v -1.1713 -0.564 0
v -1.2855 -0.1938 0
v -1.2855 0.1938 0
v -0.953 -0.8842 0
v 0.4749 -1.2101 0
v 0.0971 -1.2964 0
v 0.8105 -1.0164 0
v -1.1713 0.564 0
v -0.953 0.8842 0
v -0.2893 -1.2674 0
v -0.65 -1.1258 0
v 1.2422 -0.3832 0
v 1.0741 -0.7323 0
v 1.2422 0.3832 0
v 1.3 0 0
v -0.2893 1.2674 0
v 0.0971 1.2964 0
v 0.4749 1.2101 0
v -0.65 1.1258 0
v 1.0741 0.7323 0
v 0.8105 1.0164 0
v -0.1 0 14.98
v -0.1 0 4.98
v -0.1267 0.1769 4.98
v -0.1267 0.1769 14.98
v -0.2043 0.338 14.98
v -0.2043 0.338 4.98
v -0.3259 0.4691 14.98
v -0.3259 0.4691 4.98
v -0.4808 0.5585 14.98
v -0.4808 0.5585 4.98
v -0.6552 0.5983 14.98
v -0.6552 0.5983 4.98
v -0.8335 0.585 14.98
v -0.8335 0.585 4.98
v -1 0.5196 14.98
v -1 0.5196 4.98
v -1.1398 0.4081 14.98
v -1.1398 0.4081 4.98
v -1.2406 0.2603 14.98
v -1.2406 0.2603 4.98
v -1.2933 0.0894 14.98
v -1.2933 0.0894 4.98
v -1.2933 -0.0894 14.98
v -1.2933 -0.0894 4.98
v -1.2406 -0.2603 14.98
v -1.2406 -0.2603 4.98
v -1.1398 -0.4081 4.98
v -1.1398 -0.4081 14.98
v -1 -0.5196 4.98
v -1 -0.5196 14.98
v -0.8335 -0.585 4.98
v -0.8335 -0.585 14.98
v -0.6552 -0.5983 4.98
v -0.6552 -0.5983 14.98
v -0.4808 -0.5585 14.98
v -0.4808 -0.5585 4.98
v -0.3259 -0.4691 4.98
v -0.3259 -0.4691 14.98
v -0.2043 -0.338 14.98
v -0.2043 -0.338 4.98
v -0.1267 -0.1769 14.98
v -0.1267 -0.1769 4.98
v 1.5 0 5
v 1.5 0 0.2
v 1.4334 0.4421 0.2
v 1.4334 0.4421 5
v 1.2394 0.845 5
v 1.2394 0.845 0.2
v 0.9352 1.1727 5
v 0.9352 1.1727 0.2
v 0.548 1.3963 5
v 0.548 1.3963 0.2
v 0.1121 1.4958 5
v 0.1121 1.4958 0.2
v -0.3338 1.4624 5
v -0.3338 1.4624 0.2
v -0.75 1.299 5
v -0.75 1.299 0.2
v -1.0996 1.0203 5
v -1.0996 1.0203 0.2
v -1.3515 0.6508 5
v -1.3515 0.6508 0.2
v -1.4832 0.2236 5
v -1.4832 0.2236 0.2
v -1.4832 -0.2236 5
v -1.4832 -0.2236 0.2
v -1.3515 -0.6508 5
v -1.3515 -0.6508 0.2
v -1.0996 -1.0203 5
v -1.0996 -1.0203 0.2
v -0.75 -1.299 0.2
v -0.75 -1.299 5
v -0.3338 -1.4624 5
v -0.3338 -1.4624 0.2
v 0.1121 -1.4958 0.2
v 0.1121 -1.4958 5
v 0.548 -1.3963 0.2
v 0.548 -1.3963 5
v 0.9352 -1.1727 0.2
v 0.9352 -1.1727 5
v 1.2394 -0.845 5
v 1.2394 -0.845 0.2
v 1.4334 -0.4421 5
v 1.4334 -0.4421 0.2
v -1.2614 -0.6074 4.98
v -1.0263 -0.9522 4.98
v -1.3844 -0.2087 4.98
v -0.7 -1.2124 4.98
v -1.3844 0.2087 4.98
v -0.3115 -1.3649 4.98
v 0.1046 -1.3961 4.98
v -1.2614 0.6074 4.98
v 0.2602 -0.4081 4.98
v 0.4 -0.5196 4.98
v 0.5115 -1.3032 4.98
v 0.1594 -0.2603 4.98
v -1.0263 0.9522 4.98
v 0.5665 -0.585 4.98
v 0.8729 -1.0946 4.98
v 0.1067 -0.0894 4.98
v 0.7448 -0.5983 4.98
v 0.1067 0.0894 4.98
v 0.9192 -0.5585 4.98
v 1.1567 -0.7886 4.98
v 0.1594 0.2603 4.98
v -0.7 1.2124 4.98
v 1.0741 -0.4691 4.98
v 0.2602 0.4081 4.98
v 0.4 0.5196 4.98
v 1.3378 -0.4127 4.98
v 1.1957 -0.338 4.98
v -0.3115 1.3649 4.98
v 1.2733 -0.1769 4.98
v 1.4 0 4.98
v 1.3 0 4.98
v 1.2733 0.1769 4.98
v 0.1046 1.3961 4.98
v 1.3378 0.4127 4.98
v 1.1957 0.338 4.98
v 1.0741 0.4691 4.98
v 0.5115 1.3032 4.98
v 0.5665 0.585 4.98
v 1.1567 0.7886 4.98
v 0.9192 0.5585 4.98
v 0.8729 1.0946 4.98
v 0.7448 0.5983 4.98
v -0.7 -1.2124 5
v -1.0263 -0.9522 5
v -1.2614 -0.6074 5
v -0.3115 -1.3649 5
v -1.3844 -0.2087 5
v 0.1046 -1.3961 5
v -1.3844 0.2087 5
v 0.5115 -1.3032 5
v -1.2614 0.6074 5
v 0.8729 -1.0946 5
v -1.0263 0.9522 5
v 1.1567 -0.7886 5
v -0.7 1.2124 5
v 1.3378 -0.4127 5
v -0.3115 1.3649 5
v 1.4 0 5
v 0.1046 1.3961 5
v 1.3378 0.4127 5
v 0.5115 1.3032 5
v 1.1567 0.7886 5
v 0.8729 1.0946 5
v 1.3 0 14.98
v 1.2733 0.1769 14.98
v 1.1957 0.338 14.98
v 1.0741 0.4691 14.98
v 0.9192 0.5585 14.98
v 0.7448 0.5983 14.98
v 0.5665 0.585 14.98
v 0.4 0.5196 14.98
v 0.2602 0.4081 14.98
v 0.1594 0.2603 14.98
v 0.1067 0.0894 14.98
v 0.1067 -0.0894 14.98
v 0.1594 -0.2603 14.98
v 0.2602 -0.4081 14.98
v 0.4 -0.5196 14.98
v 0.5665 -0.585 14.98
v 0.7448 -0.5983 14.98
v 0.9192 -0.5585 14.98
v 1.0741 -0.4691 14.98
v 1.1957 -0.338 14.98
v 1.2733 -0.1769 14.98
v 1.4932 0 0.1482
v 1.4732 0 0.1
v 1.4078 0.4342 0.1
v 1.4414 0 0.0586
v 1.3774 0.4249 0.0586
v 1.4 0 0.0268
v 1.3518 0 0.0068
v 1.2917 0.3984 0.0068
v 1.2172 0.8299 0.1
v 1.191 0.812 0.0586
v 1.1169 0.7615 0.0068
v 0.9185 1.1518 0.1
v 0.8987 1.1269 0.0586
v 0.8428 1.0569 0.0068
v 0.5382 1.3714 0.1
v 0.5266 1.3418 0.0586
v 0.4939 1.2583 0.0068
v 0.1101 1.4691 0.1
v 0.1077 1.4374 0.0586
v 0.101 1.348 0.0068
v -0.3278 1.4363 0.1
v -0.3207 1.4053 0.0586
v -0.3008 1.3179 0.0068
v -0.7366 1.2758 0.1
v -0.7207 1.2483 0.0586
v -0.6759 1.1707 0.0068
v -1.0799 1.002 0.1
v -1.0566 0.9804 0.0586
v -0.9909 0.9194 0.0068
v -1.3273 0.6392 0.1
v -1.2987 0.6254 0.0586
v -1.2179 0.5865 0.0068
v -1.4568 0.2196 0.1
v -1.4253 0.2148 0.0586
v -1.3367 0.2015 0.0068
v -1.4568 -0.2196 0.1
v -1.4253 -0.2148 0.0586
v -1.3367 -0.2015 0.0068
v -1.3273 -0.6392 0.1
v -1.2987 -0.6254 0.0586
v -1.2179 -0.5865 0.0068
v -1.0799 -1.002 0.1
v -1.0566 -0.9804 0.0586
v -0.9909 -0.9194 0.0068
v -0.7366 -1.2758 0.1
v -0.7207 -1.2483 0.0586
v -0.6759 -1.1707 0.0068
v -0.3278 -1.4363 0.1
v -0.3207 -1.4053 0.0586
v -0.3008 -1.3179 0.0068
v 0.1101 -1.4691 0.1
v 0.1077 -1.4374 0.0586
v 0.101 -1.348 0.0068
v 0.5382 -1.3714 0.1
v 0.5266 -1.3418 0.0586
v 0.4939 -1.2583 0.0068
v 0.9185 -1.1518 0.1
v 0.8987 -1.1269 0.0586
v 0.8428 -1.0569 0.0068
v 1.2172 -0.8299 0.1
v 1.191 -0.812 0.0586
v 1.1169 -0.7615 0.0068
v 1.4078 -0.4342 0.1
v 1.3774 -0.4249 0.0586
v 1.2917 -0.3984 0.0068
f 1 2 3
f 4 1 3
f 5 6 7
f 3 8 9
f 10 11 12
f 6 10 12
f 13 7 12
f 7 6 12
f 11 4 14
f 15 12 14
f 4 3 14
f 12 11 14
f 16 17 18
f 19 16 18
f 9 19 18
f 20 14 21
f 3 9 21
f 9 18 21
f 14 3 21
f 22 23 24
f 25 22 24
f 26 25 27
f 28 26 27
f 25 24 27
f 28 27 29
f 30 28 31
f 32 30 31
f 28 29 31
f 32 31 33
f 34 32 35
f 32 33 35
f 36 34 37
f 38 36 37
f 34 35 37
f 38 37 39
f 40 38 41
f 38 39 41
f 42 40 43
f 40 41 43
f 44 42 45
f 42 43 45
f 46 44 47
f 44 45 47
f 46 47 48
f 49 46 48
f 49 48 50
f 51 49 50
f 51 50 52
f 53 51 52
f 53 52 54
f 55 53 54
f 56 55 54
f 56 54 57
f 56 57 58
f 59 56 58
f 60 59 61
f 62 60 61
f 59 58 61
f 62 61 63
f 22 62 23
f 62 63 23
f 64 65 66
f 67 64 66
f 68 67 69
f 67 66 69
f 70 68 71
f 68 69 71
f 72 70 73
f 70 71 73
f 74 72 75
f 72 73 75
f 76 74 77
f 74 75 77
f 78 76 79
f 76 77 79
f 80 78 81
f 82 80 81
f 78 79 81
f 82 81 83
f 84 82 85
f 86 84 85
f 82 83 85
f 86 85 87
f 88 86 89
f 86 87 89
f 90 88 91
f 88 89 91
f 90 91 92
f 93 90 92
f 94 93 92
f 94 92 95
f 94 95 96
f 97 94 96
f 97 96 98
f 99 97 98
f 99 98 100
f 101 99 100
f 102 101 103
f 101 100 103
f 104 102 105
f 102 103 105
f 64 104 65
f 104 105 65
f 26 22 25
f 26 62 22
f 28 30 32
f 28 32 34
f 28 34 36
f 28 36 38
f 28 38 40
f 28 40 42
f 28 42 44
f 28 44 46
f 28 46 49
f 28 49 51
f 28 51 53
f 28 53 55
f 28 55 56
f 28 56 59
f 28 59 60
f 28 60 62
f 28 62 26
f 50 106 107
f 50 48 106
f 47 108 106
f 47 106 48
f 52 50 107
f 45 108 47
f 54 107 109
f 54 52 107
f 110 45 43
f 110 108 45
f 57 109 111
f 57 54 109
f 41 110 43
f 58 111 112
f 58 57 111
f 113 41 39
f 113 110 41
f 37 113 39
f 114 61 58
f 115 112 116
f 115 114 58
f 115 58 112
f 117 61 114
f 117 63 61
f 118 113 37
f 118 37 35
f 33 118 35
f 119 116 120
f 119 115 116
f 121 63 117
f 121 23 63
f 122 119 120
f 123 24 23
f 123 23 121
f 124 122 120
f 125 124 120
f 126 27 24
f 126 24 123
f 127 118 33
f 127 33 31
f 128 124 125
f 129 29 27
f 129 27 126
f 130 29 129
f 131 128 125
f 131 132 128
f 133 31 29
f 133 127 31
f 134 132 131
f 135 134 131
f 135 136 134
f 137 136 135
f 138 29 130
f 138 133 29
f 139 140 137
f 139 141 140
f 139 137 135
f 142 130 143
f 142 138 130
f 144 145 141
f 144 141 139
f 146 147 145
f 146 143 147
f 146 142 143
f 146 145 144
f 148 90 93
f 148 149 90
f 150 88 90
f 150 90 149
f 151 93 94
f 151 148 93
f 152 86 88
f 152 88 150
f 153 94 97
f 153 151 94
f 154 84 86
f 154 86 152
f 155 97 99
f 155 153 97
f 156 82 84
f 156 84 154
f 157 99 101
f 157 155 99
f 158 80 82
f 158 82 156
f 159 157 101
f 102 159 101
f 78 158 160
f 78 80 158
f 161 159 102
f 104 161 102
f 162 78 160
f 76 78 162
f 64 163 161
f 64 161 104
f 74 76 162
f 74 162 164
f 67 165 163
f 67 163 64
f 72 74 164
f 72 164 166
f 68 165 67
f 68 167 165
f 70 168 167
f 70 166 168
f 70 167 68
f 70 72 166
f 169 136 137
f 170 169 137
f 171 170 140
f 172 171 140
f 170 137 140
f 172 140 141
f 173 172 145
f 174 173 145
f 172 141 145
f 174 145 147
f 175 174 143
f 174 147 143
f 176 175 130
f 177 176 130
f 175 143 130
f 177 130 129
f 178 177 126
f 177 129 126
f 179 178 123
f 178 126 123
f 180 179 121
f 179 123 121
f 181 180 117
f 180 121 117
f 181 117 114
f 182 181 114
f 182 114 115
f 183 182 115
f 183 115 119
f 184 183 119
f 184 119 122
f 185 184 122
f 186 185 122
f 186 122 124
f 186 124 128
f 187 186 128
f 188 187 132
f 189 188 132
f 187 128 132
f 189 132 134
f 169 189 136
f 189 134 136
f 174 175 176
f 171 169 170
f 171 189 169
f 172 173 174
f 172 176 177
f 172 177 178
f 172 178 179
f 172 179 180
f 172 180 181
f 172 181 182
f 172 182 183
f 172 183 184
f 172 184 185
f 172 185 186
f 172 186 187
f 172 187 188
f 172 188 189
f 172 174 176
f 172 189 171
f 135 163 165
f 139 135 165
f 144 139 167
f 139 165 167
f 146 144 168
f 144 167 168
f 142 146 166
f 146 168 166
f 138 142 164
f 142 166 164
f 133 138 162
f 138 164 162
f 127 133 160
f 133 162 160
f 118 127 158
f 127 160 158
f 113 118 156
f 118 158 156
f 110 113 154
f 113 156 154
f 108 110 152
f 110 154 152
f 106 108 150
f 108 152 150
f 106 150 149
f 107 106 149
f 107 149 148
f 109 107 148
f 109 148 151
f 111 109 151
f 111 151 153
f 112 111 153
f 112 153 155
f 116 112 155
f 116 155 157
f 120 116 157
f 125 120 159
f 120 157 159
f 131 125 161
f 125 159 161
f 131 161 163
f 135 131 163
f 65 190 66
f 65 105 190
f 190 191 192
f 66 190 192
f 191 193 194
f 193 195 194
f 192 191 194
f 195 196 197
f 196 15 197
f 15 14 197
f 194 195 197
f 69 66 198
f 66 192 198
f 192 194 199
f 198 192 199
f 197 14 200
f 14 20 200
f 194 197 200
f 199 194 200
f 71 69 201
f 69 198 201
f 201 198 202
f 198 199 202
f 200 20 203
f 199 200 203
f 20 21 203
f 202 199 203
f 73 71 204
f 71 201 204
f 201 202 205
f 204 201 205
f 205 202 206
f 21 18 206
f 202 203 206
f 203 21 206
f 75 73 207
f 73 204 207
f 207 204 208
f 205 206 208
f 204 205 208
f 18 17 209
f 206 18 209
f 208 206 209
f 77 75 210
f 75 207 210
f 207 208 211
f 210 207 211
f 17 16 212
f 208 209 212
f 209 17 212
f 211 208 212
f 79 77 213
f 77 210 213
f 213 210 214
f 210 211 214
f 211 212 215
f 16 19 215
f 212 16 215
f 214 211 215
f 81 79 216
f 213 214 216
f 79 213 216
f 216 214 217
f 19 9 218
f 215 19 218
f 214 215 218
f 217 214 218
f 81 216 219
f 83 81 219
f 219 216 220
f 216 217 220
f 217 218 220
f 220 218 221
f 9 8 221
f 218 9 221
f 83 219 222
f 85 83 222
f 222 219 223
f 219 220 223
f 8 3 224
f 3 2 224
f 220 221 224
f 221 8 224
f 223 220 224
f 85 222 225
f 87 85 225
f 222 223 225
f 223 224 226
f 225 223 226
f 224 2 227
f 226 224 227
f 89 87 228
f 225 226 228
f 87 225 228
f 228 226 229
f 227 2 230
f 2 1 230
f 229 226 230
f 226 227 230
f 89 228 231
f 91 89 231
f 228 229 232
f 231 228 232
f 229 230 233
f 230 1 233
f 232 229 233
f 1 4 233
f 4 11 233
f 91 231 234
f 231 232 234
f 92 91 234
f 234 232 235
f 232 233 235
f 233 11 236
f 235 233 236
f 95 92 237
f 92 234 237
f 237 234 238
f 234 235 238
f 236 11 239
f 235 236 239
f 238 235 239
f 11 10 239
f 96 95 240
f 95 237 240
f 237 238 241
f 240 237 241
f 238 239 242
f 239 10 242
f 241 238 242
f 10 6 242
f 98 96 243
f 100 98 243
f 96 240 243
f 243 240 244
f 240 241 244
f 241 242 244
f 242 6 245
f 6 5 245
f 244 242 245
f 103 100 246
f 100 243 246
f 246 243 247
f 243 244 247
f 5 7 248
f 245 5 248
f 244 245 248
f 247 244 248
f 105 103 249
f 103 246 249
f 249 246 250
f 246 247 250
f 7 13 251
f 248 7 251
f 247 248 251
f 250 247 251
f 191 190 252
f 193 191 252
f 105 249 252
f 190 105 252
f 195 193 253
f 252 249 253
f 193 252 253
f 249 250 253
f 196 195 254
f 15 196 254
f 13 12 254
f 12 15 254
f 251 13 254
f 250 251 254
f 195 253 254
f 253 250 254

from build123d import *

# Parameters (mm, degrees)
ESQUISSE1_R             = 1.5
BOSS_EXTRU_1_DEPTH      = 5
CONG_1_R                = 0.2
ESQUISSE2_R             = 1.4
ENL_V_MAT_EXTRU_1_DEPTH = 0.02
ESQUISSE3_R             = 0.6
BOSS_EXTRU_2_DEPTH      = 10


with BuildPart() as part:
    # Esquisse1 → Boss.-Extru.1 (new body)
    with BuildSketch(Plane.XY):
        Circle(ESQUISSE1_R)
    extrude(amount=BOSS_EXTRU_1_DEPTH)

    # Congé1
    cong_1_edges = [part.edges().sort_by_distance(p)[0] for p in [
        (-1.5, 0, 0),
    ]]
    fillet(cong_1_edges, radius=CONG_1_R)

    # Esquisse2 → Enlèv. mat.-Extru.1 (cut)
    with BuildSketch(Plane.XY.offset(5)):
        Circle(ESQUISSE2_R)
    extrude(amount=-ENL_V_MAT_EXTRU_1_DEPTH, mode=Mode.SUBTRACT)

    # Esquisse3 → Boss.-Extru.2 (add)
    with BuildSketch(Plane.XY.offset(4.98)):
        with Locations((-0.7, 0)):
            Circle(ESQUISSE3_R)
        with Locations((0.7, 0)):
            Circle(ESQUISSE3_R)
    extrude(amount=BOSS_EXTRU_2_DEPTH)


solid = part.part
